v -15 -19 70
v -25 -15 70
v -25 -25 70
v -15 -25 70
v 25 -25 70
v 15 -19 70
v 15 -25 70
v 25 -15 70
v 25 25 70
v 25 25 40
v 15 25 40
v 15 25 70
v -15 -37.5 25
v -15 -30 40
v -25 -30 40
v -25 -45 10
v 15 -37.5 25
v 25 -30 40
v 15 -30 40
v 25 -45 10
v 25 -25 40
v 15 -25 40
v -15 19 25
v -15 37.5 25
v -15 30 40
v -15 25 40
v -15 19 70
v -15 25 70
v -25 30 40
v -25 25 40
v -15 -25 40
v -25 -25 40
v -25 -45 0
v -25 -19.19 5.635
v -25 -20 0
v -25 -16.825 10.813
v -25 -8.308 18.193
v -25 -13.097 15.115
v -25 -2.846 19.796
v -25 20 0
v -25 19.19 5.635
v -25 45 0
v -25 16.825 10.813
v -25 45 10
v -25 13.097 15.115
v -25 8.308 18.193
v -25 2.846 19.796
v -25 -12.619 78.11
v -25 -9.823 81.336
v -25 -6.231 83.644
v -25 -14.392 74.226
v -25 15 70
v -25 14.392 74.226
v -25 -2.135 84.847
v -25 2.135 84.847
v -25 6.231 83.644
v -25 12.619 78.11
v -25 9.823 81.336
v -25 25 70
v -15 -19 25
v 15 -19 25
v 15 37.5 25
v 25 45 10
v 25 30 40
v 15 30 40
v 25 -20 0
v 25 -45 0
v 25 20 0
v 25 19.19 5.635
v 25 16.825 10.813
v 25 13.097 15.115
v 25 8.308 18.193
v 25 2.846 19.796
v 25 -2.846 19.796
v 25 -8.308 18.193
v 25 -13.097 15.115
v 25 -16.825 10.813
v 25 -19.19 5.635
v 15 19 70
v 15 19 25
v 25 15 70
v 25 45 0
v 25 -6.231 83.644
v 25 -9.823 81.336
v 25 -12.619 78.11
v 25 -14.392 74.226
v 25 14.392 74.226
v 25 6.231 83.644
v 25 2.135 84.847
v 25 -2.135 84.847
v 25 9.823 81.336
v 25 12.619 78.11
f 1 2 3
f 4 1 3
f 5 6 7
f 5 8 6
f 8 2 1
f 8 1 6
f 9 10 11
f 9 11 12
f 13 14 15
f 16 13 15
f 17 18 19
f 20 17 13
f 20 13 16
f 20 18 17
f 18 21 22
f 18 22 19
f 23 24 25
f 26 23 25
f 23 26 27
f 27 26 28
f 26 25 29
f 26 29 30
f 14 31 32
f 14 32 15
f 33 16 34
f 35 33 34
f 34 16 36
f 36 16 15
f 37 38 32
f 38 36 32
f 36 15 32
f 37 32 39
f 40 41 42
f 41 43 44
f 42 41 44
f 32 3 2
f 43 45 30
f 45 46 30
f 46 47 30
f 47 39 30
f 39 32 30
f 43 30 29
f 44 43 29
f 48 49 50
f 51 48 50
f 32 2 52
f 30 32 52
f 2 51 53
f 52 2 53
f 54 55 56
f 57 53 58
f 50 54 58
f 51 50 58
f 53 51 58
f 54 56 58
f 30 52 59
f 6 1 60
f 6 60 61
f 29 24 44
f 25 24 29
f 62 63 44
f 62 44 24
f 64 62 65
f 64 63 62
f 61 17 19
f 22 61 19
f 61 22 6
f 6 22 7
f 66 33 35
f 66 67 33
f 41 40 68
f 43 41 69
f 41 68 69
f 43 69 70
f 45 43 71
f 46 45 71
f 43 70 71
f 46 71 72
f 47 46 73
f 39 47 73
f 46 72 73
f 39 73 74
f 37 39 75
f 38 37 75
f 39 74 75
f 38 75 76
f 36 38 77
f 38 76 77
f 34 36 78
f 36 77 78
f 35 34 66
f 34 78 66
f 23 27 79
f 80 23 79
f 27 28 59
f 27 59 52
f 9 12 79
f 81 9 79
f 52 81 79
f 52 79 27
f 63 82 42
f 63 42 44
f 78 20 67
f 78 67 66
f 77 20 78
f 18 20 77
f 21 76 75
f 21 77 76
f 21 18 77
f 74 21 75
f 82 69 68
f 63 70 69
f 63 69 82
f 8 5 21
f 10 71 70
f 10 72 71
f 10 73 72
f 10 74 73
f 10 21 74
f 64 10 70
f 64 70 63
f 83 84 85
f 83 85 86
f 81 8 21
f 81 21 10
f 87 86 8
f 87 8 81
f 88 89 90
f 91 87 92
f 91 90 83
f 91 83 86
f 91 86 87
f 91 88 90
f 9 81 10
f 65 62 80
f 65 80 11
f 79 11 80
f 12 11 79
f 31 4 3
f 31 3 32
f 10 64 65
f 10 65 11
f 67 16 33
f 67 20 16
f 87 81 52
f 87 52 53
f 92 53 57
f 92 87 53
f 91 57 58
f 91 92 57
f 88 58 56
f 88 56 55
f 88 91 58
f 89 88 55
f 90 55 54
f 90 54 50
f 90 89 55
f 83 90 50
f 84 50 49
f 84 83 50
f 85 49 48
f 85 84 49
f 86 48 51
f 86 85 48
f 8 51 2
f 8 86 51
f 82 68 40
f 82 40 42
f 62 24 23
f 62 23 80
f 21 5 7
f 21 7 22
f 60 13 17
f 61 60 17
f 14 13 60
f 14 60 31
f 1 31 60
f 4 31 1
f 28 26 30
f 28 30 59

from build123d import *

# Parameters (mm, degrees)
F1_DEPTH = 25
F2_R     = 20
F3_DEPTH = 50.001
F4_R     = 15
F5_DEPTH = 50
F6_W     = 30
F6_H     = 45
F7_DEPTH = 26


# Not quite as in the source:
# - a pattern or mirror of a feature is missing from the dataset's text; its kind, count and spacing are read off the source's solid


with BuildPart() as f1:
    # F0 (on Right) → F1 (new body, symmetric)
    with BuildSketch(Plane.YZ):
        Polygon((-45, 0), (0, 0), (45, 0), (45, 10), (30, 40), (25, 40), (25, 70), (0, 70), (-25, 70), (-25, 40), (-30, 40), (-45, 10), align=None)
    extrude(amount=F1_DEPTH, both=True)

    # F2 (on face) → F3 (cut, through all)
    with BuildSketch(Plane.YZ.offset(25)):
        Circle(F2_R)
    extrude(amount=-F3_DEPTH, mode=Mode.SUBTRACT)

    # F4 (on face) → F5 (join)
    with BuildSketch(Plane.YZ.offset(25)):
        with Locations((0, 70)):
            Circle(F4_R)
    extrude(amount=-F5_DEPTH)

    # F6 (on face) → F7 (cut)
    with BuildSketch(Plane.XZ.offset(45)):
        with Locations((0, 47.5)):
            Rectangle(F6_W, F6_H)
    f7 = extrude(amount=-F7_DEPTH, mode=Mode.SUBTRACT)

    # F7_copies: F7 across plane
    add(f7.mirror(Plane.ZX), mode=Mode.SUBTRACT)


solid = f1.part
